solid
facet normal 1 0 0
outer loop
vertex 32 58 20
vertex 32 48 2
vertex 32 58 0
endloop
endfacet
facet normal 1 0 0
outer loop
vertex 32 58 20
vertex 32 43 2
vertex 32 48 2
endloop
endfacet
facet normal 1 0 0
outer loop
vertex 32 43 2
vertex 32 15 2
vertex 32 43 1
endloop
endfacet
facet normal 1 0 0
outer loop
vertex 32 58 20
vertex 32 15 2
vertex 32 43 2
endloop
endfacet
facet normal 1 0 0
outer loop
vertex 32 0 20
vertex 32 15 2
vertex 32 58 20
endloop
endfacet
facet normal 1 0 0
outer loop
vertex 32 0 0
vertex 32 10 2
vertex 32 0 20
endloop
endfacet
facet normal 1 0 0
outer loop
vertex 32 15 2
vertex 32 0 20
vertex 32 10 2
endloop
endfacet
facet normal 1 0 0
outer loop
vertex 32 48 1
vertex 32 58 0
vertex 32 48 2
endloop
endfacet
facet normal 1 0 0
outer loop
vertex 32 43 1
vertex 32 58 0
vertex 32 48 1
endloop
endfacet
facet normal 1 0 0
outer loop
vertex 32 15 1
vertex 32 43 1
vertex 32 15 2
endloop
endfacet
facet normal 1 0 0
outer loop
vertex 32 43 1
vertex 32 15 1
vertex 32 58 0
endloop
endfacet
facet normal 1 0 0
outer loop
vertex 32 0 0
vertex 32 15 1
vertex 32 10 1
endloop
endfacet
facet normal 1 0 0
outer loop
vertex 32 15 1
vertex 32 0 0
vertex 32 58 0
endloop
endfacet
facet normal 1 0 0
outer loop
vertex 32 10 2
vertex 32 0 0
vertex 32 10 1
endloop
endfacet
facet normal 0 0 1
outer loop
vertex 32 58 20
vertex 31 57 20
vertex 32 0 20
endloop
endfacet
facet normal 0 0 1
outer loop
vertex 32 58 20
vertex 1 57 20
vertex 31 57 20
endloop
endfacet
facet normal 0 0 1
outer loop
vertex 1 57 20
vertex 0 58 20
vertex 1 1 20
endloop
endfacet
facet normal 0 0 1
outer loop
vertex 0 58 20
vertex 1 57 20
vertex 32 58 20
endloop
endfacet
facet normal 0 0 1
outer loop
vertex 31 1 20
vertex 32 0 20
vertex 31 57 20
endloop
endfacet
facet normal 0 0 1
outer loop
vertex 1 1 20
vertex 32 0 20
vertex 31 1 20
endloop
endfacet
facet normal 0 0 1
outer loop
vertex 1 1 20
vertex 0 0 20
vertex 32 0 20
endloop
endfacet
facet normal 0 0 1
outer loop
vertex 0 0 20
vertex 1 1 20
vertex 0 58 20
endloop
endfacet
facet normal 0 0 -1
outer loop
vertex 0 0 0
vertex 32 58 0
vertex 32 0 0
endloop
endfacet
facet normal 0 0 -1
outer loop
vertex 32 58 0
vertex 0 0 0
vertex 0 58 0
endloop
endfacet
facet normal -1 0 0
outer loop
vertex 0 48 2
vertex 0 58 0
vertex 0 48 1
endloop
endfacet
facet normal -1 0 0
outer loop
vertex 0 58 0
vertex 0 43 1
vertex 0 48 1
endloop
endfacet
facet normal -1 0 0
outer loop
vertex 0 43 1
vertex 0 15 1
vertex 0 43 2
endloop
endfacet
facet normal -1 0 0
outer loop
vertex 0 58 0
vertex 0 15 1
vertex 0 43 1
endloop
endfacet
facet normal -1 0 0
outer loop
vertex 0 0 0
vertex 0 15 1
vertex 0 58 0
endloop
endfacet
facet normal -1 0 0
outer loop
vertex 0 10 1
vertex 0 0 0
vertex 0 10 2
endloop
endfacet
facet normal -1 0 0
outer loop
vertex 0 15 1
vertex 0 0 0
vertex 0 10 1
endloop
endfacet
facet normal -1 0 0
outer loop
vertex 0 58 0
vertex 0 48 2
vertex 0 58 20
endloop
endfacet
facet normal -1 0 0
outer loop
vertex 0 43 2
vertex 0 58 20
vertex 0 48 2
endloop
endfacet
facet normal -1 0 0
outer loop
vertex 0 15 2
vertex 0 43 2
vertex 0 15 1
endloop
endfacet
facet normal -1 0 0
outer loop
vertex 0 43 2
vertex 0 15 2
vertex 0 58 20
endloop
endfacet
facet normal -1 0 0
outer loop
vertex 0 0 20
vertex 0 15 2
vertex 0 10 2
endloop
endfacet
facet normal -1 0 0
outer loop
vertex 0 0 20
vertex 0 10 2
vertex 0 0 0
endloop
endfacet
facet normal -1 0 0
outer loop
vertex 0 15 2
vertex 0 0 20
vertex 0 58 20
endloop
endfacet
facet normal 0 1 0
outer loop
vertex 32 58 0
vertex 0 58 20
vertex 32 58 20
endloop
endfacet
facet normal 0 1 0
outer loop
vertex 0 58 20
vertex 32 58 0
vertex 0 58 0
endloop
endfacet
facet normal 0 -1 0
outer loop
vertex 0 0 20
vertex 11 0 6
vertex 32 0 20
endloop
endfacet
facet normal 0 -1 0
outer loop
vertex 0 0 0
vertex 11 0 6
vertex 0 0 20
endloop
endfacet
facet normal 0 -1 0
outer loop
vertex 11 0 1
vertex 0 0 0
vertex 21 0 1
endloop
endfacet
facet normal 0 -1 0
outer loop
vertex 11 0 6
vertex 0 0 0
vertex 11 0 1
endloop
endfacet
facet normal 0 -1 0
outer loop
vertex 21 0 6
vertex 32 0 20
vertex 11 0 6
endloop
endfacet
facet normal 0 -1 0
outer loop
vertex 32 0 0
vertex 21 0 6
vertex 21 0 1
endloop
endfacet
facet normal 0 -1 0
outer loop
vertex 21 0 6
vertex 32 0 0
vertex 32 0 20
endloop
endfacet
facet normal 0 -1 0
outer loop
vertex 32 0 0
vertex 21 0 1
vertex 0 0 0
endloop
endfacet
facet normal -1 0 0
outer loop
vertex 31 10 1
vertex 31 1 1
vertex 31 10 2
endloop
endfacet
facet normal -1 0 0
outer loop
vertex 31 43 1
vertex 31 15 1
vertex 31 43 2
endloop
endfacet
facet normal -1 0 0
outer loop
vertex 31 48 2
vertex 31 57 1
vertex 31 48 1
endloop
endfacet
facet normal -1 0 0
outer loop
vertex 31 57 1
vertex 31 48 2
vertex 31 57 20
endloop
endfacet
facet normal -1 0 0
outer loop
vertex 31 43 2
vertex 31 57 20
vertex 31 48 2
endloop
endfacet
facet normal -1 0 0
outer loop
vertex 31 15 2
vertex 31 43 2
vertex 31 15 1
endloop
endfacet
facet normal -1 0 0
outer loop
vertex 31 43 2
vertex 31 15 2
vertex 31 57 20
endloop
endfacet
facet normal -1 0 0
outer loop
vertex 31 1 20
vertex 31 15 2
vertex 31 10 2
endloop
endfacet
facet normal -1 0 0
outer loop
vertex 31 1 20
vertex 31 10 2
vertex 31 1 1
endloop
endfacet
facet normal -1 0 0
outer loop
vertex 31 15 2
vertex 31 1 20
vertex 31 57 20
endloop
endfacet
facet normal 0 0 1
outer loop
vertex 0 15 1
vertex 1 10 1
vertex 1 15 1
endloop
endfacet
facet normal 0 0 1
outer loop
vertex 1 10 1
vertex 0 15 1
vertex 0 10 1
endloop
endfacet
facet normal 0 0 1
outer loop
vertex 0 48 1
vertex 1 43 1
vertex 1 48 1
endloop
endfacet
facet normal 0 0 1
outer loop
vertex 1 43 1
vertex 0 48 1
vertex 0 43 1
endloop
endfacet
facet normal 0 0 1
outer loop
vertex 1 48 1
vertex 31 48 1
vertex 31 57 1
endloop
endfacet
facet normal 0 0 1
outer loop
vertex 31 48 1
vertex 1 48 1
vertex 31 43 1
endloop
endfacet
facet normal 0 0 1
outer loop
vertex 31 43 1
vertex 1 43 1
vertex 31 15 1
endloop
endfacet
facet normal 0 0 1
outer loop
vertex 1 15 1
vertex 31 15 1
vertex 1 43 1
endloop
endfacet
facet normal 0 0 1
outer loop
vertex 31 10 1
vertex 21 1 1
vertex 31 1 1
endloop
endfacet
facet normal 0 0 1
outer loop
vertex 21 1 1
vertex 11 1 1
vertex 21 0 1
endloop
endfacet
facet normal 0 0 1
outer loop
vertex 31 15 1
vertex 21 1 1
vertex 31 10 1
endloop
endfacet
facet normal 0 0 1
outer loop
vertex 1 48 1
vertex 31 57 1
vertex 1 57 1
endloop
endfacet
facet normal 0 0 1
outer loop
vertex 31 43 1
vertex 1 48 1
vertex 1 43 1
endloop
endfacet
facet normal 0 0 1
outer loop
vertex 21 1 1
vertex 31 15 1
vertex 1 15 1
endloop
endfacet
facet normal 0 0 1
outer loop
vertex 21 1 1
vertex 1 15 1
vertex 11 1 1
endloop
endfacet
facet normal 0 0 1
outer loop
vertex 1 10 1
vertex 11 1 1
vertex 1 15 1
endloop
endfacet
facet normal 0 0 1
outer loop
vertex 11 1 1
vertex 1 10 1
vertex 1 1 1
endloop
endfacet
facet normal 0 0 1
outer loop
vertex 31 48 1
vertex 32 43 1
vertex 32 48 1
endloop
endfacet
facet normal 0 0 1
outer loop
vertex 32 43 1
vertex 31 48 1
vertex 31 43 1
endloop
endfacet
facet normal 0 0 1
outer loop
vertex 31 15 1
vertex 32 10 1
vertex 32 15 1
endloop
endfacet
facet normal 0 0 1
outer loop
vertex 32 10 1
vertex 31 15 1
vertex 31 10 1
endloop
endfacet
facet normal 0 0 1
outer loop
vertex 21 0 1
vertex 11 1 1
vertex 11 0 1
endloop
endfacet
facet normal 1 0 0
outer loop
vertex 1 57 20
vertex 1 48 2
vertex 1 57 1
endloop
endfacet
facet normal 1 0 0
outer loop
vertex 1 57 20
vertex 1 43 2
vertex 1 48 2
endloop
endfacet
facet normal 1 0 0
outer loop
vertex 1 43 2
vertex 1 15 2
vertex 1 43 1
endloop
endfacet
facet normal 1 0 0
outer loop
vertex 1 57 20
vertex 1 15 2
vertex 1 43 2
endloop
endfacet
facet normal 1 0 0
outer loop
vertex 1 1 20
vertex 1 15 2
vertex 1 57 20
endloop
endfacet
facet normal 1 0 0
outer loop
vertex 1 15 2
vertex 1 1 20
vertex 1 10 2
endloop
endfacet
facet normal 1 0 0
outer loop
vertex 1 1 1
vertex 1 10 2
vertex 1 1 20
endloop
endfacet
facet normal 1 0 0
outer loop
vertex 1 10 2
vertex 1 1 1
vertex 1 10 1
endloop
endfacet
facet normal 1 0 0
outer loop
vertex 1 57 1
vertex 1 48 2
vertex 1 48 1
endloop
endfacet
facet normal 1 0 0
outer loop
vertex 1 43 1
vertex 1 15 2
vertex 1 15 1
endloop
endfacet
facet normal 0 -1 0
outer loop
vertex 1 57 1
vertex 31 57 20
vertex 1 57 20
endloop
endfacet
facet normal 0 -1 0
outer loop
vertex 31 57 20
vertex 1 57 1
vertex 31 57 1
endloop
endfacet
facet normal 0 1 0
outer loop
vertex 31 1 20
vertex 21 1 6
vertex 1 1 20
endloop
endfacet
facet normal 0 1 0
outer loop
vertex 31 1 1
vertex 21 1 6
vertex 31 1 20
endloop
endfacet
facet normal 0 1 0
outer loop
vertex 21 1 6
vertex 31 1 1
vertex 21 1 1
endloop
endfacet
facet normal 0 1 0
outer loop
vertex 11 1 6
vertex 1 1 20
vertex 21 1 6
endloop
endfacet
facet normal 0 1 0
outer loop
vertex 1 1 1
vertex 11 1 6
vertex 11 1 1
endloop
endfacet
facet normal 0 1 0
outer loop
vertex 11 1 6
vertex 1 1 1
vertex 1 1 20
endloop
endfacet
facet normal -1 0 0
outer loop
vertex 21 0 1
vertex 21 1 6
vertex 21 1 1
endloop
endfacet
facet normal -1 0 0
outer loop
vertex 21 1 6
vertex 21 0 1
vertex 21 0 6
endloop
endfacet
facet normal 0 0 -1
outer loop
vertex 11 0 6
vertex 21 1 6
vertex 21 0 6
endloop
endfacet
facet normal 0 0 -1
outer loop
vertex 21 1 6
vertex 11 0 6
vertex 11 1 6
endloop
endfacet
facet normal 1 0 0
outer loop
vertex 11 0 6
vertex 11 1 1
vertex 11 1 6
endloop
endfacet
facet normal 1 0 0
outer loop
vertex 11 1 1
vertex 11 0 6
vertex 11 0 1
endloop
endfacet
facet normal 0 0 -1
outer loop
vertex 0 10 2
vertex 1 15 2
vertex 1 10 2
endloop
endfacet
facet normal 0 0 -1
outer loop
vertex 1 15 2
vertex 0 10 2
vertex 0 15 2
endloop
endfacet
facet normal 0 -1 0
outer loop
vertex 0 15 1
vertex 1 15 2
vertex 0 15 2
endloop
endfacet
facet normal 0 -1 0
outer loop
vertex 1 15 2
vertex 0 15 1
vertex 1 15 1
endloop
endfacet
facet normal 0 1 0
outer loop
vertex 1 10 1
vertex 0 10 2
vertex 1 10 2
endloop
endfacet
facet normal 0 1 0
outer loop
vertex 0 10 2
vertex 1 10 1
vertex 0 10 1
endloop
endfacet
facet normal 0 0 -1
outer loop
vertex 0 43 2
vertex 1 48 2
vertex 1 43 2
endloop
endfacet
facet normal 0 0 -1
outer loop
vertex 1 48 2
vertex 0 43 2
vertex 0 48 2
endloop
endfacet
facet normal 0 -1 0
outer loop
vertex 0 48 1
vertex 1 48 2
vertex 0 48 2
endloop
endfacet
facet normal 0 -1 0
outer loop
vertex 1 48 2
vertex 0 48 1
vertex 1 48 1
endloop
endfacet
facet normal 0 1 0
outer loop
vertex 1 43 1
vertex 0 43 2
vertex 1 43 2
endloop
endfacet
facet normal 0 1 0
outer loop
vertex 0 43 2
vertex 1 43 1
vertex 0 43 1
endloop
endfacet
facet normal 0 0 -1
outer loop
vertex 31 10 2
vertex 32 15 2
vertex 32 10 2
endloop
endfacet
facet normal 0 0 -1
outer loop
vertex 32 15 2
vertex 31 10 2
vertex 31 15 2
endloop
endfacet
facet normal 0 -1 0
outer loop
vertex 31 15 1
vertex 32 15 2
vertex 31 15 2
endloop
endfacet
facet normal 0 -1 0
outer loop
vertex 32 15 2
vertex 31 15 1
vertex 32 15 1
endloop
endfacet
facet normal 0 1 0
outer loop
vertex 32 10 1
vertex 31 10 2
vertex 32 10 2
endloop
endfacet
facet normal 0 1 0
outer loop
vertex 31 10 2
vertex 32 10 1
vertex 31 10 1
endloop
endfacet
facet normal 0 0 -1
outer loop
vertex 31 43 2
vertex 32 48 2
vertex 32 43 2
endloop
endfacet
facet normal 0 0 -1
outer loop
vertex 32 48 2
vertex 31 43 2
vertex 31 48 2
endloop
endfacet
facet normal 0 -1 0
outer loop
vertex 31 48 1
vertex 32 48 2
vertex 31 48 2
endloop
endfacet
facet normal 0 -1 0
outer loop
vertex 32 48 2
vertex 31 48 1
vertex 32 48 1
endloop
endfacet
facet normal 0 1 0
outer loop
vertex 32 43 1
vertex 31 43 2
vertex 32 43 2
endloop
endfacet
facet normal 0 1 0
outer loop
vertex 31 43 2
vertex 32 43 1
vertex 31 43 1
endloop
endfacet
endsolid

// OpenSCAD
// All dimensions in mm

// === MAIN PARAMETERS ===
box_width = 32;      // X dimension
box_length = 58;     // Y dimension  
box_height = 20;     // Z dimension

wall_width = 1;

usb_width = 10;
usb_height = 5;

strap_width = 5;
strap_height = 1;

mcu_length = 21.11;
mcu_width = 15.75;
mcu_hole_diameter = 3.12;

$fn = 360;

module usb_hole() {
    cube([usb_width,10,usb_height]);
}

module strap_hole() {
    cube([strap_width,strap_width,strap_height]);
}

module enclosure() {
    difference() {
        cube([box_width, box_length, box_height]);
        translate([wall_width, wall_width, wall_width,]) {
            cube([box_width-(wall_width*2), box_length-(wall_width*2), box_height-(wall_width/2)]);
        }
        
        // USB Hole
        translate([(box_width/2)-(usb_width/2),-5,wall_width]) {
            usb_hole();
        }
        
        // Strap Holes
        translate([-2, 10, wall_width]) {
            strap_hole();
        }

        translate([-2, 43, wall_width]) {
            strap_hole();
        }

        translate([29, 10, wall_width]) {
            strap_hole();
        }

        translate([29, 43, wall_width]) {
            strap_hole();
        }
    }
   
}

module MCU() {
    difference() {
        cube([mcu_length, 1, mcu_width]);
        rotate([90, 0, 0]) {
            translate([4.335,mcu_width-4.335,-2]) {
                cylinder(r=mcu_hole_diameter/2, h=2);
            }
        }
        rotate([90, 0, 0]) {
            translate([mcu_length-4.335,mcu_width-4.335,-2]) {
                cylinder(r=mcu_hole_diameter/2, h=2);
            }
        }
    }
}



enclosure();
translate([box_width/2-(mcu_length/2),2,8]) {
    // MCU();
}

module pins() {
     translate([9.8,4,(8+mcu_width)-4.335]) {
        rotate([90,0,0]) {
            cylinder(r=1.4, h=3);
        }
    }
    translate([22.2,4,(8+mcu_width)-4.335]) {
        rotate([90,0,0]) {
            cylinder(r=1.4, h=3);
        }
    }
}
